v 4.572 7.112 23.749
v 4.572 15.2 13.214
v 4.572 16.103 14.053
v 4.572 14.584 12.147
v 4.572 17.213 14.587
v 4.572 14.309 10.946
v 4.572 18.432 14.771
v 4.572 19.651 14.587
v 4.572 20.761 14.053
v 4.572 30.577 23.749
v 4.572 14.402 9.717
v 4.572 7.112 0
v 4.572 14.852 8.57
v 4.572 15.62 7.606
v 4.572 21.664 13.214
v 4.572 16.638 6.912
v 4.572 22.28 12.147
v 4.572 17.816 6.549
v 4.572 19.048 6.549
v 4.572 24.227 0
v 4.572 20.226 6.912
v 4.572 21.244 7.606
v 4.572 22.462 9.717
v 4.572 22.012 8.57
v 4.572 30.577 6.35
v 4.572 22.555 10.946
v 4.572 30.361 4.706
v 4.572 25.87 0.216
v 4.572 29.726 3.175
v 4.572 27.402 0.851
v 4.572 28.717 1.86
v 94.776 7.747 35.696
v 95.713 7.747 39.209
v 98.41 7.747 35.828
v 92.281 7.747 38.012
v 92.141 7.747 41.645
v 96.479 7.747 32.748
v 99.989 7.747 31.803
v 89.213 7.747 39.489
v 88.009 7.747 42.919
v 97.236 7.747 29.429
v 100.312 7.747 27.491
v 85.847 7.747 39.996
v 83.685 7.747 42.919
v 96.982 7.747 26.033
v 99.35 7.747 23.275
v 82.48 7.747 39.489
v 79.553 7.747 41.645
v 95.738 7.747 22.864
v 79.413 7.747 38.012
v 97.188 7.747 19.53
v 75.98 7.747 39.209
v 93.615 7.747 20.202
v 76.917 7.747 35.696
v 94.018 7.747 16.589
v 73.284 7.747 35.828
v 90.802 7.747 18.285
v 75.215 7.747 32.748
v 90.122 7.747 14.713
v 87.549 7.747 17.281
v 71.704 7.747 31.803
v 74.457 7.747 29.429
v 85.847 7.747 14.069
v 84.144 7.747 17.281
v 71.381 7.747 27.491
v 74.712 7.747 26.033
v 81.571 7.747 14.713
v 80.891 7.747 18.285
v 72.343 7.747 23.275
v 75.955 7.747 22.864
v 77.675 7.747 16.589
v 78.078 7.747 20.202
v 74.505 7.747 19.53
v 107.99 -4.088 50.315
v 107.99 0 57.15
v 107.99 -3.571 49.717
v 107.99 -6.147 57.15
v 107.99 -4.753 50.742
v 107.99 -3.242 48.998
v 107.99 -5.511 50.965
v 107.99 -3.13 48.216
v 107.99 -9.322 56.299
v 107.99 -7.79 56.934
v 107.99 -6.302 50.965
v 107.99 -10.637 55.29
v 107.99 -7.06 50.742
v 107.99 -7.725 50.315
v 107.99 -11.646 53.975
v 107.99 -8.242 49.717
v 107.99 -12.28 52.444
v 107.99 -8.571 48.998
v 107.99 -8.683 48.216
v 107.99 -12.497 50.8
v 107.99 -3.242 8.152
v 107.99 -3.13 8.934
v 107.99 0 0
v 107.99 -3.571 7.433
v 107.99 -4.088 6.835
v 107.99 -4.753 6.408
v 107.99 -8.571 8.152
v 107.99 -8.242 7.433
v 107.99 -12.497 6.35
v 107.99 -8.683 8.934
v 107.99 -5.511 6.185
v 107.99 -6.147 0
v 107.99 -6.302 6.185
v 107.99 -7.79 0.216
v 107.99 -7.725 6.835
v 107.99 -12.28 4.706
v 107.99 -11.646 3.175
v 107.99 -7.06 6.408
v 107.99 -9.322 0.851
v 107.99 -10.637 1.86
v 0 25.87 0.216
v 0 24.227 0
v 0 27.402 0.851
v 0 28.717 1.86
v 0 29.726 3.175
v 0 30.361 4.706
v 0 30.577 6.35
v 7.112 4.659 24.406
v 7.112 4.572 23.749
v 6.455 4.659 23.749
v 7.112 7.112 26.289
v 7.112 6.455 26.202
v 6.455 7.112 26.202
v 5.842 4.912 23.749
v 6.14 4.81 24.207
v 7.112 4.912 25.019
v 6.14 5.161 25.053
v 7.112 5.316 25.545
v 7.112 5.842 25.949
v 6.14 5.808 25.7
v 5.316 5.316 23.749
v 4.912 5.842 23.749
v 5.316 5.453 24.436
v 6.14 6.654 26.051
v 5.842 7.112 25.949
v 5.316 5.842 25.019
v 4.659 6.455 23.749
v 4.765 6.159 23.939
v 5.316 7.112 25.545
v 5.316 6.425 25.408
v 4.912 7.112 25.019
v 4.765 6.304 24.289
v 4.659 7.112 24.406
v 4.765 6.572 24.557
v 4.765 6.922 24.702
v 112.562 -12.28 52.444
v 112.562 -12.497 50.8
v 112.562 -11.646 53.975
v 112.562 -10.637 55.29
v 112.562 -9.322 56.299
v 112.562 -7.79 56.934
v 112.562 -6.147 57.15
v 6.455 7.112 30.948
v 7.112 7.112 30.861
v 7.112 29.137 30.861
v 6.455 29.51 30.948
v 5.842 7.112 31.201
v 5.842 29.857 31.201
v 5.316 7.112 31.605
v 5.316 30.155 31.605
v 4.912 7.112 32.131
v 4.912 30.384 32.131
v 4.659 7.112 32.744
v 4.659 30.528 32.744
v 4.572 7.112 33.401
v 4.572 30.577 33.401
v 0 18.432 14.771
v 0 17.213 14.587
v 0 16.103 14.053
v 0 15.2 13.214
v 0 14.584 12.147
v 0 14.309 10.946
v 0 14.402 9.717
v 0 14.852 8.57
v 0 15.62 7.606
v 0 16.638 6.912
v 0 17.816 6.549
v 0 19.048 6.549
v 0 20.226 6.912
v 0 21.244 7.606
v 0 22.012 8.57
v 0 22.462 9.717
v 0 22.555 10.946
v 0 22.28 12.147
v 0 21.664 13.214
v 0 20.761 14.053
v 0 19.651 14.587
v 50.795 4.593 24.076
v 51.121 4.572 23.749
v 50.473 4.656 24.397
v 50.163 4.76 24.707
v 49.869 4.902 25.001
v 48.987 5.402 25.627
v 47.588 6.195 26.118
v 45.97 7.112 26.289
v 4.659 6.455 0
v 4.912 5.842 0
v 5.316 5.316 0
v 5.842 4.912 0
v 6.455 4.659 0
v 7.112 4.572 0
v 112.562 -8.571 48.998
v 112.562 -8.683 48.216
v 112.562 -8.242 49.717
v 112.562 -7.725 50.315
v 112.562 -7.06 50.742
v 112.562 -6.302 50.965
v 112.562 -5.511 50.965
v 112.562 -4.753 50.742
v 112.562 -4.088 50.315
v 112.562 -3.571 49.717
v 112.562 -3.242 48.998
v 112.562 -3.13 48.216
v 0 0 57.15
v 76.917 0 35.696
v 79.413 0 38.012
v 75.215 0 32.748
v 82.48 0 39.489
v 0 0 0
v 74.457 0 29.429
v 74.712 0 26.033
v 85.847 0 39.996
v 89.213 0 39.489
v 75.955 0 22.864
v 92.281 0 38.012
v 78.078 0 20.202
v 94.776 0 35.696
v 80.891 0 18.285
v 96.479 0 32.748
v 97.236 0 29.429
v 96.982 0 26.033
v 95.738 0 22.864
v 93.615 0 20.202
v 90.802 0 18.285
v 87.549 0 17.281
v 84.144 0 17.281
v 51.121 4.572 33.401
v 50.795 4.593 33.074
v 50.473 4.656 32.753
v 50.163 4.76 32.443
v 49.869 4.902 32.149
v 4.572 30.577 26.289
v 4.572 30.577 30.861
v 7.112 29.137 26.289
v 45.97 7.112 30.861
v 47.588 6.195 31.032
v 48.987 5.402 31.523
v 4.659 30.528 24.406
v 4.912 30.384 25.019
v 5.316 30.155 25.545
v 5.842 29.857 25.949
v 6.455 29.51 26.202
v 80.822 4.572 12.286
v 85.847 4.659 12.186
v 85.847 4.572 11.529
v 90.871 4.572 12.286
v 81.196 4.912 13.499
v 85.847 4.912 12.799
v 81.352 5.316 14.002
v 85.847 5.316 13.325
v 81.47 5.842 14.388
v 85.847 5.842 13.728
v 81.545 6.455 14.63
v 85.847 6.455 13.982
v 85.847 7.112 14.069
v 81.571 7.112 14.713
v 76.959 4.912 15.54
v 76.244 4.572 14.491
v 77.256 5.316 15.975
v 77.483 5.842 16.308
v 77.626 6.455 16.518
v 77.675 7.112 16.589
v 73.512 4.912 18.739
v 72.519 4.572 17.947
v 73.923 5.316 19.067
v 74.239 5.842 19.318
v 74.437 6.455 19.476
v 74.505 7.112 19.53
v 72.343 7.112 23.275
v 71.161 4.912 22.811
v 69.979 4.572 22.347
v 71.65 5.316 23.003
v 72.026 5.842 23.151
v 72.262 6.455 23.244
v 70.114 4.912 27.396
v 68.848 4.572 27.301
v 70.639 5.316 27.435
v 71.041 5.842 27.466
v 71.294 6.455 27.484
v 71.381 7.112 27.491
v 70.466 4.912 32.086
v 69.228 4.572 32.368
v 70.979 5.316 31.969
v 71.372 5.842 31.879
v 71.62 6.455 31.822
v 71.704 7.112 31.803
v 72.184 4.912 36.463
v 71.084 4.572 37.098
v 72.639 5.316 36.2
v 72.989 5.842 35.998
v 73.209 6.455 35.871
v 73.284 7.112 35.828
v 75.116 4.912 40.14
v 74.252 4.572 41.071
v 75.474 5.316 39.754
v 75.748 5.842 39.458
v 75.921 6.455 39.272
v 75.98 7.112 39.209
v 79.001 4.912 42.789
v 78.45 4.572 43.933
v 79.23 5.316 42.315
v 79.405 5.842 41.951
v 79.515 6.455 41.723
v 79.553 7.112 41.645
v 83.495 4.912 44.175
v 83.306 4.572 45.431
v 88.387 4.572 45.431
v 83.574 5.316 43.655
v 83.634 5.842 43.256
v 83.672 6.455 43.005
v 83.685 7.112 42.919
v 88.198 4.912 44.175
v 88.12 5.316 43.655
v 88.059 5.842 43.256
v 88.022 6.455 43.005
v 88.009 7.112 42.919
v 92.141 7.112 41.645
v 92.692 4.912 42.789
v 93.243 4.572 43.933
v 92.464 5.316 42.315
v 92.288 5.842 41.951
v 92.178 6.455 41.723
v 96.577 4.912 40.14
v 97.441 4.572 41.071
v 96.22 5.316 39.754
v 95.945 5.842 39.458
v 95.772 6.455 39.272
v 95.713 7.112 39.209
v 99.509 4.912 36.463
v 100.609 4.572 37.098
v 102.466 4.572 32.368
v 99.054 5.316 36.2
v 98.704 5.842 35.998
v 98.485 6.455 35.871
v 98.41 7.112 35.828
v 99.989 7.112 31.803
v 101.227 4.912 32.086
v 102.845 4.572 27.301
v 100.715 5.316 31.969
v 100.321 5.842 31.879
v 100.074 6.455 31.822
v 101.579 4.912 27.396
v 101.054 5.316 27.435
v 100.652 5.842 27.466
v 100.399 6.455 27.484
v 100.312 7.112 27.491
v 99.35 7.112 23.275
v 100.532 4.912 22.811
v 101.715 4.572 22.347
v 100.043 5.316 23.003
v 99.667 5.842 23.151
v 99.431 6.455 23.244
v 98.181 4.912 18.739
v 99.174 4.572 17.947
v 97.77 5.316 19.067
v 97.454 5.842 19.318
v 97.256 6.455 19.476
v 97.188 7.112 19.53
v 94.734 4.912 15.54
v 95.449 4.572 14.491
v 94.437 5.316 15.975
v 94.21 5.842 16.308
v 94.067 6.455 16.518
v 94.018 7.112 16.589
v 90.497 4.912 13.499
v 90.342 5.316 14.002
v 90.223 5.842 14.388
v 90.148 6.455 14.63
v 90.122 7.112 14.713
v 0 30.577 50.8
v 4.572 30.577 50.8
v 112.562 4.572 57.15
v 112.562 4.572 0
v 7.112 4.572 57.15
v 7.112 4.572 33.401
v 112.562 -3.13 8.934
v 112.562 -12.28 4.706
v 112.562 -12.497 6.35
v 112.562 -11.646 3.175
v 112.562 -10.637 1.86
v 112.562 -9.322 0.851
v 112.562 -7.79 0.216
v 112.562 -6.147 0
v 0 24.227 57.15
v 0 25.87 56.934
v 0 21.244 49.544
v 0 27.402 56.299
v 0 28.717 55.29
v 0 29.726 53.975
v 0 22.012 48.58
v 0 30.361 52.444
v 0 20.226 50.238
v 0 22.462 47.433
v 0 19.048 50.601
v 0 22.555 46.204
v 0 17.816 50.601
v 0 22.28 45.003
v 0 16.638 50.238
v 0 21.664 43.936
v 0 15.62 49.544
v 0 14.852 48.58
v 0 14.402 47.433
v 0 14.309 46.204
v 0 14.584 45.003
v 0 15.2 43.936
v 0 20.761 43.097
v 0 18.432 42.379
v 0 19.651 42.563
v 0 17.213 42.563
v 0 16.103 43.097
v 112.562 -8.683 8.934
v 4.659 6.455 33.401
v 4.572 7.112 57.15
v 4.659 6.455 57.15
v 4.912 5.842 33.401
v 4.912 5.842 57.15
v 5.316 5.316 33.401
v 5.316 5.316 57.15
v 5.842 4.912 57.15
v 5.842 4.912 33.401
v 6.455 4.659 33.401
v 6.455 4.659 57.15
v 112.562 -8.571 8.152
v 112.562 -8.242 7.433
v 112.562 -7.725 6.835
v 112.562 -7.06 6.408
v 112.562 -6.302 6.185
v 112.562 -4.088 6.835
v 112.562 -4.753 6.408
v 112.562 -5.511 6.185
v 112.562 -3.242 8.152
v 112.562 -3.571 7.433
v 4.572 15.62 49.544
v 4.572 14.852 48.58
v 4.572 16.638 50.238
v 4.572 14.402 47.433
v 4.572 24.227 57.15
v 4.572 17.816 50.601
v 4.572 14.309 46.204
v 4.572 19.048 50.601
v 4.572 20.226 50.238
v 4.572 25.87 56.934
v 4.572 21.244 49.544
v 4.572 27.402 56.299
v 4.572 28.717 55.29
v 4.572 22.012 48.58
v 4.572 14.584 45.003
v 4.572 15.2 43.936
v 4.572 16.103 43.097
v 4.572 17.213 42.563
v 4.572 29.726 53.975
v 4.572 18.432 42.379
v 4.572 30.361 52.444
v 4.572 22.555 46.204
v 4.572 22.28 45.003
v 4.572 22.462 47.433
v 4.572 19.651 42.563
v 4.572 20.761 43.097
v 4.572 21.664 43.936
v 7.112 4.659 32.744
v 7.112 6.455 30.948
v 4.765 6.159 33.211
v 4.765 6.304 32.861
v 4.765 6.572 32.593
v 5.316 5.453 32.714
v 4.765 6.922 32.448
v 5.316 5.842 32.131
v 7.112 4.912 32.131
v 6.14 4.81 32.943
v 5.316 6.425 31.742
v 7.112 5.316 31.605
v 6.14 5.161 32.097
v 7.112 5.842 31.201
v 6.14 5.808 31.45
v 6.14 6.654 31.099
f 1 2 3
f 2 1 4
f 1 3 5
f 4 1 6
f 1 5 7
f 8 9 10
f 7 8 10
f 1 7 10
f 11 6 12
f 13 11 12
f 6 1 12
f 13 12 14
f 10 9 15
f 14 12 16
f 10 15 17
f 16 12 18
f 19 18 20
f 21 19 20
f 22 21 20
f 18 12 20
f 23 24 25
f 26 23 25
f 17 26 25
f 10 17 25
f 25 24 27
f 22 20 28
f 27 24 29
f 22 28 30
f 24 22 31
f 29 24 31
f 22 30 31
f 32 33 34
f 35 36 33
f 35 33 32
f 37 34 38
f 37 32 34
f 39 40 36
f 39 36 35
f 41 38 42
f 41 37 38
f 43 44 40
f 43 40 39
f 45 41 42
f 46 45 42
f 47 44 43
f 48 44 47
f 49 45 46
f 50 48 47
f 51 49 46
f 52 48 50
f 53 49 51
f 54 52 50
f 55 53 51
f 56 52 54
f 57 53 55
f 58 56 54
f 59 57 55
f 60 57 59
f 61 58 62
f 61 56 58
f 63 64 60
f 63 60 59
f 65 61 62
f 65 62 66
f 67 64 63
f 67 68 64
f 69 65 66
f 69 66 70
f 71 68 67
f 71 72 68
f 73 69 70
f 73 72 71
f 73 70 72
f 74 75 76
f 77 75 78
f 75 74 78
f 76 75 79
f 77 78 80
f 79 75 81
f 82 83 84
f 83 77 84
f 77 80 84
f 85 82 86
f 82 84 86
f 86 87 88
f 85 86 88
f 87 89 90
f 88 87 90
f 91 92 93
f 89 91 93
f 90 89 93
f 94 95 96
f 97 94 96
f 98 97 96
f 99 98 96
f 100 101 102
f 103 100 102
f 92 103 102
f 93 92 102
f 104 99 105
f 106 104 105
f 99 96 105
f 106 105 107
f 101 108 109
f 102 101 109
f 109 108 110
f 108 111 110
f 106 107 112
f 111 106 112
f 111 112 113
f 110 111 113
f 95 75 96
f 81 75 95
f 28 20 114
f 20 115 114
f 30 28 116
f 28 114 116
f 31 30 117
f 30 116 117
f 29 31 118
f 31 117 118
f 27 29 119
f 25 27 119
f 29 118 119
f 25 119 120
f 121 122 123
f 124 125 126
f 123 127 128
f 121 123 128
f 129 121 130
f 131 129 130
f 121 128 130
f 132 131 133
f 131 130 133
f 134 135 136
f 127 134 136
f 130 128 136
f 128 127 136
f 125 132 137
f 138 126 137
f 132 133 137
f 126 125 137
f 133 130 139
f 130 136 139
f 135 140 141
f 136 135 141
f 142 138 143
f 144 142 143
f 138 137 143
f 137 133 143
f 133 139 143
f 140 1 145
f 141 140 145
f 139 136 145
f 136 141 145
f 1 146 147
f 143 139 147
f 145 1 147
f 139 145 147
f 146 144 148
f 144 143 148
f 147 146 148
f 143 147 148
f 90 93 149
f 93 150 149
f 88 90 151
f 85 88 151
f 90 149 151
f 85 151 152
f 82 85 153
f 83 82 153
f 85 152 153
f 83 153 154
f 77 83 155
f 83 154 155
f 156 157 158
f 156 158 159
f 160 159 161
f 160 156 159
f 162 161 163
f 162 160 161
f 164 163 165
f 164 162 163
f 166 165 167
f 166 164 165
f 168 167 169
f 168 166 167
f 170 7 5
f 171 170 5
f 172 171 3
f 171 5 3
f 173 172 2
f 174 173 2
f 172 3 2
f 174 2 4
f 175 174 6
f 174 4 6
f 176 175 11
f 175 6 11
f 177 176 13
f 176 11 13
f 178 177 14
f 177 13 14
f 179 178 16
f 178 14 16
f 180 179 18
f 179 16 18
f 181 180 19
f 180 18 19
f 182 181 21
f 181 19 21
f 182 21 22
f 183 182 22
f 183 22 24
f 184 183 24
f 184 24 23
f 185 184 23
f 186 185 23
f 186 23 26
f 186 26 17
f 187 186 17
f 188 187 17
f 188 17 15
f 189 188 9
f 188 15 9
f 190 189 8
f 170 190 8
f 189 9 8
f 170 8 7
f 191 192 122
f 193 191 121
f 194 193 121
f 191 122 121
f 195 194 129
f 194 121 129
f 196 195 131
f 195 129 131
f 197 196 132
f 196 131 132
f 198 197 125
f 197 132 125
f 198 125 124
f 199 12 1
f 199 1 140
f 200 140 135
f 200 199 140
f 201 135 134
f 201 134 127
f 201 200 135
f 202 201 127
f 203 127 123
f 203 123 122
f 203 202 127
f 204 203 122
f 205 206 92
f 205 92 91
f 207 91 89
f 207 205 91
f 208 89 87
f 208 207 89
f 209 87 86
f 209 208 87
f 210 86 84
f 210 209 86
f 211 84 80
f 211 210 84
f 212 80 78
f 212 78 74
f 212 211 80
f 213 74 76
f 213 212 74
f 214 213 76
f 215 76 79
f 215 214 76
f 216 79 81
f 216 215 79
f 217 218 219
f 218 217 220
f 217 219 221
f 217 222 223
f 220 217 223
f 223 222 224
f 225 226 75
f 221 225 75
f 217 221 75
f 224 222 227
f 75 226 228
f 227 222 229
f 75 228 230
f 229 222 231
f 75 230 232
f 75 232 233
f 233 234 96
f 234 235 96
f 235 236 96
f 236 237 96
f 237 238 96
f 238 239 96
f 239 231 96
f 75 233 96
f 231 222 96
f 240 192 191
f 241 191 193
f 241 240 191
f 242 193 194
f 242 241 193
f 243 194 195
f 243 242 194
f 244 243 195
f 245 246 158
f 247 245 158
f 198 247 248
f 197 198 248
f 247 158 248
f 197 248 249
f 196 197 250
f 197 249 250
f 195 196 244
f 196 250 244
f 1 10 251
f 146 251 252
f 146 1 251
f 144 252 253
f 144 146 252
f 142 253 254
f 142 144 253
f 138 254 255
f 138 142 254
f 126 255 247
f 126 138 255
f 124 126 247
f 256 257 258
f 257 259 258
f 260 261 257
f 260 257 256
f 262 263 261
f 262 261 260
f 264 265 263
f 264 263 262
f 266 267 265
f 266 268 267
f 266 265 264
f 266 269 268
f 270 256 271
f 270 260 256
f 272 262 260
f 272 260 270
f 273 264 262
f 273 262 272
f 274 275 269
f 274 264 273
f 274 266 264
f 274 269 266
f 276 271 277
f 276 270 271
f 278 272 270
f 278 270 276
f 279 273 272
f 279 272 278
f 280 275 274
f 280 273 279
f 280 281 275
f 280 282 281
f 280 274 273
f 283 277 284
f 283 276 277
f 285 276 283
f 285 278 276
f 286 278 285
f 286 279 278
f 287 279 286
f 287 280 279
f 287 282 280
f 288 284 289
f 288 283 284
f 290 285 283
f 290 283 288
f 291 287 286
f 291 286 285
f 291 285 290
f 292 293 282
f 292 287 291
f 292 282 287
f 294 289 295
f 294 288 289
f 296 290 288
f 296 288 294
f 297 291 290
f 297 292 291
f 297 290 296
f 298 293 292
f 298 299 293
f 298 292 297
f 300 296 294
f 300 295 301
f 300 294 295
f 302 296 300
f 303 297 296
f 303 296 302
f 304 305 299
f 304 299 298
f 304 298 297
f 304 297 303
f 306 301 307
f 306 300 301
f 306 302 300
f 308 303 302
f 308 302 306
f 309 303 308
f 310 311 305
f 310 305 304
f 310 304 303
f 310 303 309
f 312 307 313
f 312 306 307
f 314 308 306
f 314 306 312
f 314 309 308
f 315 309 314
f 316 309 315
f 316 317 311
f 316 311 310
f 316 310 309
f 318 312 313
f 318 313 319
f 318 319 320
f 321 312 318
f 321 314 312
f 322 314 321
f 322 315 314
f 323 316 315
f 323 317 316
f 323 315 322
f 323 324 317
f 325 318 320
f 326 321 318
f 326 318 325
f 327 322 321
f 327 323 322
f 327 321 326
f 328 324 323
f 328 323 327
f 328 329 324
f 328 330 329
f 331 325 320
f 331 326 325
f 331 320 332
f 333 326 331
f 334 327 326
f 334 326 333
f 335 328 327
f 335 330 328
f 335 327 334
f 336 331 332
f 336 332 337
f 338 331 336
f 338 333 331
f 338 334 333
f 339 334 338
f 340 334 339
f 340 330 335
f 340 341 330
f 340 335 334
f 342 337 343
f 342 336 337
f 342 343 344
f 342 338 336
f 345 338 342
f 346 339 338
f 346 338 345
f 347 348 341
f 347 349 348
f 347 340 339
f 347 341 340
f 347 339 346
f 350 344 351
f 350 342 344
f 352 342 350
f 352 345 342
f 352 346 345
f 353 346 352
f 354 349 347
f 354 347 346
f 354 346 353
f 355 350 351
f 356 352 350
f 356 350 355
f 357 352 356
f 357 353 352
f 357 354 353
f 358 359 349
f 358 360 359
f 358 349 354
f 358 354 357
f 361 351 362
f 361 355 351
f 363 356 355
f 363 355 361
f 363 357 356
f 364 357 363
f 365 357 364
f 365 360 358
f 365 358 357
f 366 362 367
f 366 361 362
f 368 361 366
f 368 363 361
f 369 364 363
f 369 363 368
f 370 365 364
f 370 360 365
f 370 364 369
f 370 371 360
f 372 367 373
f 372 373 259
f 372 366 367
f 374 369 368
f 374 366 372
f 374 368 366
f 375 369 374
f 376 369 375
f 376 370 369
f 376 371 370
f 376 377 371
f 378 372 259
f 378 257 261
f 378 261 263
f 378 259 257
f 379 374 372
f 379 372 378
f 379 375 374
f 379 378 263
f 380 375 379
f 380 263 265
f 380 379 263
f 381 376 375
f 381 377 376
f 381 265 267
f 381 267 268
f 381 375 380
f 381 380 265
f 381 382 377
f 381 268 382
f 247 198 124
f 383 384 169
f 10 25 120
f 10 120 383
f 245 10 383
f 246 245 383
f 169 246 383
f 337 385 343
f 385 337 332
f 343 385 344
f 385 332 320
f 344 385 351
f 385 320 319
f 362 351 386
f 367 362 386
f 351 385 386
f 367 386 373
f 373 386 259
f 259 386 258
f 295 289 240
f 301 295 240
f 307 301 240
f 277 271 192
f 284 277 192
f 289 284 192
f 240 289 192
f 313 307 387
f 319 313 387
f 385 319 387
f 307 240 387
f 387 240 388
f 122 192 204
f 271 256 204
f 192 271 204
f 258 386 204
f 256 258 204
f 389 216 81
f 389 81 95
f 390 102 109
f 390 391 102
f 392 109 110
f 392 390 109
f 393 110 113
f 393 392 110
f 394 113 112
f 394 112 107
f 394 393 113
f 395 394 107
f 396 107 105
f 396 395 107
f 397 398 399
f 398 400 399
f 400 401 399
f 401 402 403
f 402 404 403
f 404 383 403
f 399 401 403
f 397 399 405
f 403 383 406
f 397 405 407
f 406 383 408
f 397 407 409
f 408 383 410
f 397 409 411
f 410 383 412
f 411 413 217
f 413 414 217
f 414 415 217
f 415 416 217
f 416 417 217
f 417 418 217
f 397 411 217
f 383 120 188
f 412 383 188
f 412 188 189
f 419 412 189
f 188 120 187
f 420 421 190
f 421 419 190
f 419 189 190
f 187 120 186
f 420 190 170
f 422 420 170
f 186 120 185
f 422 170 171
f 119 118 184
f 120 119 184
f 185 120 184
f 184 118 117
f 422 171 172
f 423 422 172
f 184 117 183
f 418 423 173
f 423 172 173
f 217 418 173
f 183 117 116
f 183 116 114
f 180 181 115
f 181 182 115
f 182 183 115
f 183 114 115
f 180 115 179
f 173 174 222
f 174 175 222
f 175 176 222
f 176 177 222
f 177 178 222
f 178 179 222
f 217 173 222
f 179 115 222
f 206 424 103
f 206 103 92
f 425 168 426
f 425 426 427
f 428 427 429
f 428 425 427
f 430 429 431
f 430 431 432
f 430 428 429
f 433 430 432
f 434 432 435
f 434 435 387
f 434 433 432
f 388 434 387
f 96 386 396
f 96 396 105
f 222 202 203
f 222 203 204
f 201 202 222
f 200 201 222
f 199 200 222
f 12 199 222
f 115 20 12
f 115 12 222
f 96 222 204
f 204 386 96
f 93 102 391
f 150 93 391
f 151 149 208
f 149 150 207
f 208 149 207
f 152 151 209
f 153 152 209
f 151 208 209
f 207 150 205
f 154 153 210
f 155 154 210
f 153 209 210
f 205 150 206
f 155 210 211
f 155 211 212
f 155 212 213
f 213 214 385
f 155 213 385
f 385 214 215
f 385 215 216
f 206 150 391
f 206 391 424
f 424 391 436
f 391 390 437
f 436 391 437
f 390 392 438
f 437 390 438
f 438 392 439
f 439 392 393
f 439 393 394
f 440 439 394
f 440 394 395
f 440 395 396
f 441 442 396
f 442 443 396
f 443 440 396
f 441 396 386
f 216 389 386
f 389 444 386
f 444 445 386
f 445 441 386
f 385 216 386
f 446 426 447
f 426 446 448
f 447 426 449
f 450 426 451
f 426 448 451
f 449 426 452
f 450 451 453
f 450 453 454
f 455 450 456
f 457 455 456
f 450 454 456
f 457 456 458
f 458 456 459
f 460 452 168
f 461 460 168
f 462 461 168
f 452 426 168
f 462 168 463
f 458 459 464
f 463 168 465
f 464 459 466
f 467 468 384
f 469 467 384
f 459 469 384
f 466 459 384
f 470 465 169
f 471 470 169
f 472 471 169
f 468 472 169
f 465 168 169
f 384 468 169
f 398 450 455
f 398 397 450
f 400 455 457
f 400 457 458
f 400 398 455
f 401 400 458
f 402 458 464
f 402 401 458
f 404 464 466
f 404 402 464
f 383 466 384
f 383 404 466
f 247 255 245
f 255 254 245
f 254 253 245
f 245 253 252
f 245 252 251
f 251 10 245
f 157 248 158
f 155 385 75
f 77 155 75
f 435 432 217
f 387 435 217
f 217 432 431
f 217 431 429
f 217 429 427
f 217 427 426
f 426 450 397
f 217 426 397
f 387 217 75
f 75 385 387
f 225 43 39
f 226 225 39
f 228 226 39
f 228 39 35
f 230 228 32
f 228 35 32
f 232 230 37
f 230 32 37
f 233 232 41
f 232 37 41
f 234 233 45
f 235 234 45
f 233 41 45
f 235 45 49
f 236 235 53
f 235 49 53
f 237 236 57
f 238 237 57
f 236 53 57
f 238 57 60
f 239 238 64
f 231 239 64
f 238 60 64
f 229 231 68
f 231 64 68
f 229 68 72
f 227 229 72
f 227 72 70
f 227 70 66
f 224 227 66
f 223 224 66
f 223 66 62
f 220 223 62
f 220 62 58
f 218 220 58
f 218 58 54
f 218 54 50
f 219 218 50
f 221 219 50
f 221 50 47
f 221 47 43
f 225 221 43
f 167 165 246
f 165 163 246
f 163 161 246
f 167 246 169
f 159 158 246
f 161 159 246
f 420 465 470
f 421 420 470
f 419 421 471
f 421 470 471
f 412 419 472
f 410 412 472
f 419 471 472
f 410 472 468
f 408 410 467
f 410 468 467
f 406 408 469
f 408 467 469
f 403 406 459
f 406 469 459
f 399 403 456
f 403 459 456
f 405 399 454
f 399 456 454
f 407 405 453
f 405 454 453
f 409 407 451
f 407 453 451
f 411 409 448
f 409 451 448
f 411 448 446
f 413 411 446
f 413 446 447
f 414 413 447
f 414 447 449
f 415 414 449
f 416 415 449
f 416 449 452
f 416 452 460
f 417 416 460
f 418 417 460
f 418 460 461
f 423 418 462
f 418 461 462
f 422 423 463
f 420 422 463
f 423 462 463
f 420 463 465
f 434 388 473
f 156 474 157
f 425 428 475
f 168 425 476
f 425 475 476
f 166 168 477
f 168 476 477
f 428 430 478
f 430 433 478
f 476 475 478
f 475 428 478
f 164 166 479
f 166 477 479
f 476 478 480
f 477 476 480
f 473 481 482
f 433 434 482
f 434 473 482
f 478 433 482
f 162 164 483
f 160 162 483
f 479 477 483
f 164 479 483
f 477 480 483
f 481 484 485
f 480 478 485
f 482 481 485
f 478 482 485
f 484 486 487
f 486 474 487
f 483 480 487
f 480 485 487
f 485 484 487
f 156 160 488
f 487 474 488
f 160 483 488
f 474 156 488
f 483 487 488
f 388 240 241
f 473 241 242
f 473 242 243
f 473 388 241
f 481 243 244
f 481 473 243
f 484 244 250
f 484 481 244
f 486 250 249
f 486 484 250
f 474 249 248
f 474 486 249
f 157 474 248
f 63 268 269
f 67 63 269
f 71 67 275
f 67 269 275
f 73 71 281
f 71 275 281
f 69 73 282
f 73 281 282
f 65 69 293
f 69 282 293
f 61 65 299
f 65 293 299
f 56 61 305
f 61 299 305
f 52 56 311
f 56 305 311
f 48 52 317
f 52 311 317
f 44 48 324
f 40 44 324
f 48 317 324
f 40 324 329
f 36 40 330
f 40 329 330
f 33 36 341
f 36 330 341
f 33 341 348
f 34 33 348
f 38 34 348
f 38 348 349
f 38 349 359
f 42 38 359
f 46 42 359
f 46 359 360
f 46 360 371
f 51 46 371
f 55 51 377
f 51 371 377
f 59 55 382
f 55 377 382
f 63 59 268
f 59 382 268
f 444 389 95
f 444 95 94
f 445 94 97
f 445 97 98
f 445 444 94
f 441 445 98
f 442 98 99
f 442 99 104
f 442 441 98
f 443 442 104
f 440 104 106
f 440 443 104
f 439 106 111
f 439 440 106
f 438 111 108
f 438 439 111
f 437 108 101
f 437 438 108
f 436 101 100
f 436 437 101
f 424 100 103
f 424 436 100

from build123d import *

# Parameters (mm, degrees)
EXTRUDE1_DEPTH = 57.15
SKETCH2_R      = 14.506414019
EXTRUDE2_DEPTH = 3.175
FILLET1_R      = 2.54
SKETCH3_R      = 11.421445599
EXTRUDE3_DEPTH = 15.875
EXTRUDE4_DEPTH = 2.286
FILLET4_R      = 2.54
FILLET5_R      = 6.35
EXTRUDE5_DEPTH = 4.572
SKETCH6_R      = 4.134080516
EXTRUDE6_DEPTH = 4.572


with BuildPart() as part:
    # Sketch1 → Extrude1 (new body)
    with BuildSketch(Plane.XY):
        Polygon((0, 30.576970443), (0, 0), (107.990032379, 0), (107.990032379, -12.496674877), (112.562032379, -12.496674877), (112.562032379, 4.572), (4.572, 4.572), (4.572, 30.576970443), align=None)
    extrude(amount=EXTRUDE1_DEPTH)

    # Sketch2 → Extrude2 (add)
    with BuildSketch(Plane(origin=(0, 4.572, 0), x_dir=(-1, 0, 0), z_dir=(0, 1, 0))):
        with Locations(Location((-85.846627335, 28.575, 0), (0, 0, 270))):
            Circle(SKETCH2_R)
    extrude(amount=EXTRUDE2_DEPTH)

    # Fillet1
    fillet1_edges = [part.edges().sort_by_distance(p)[0] for p in [
        (85.846627335, 4.572, 43.081414019),
    ]]
    fillet(fillet1_edges, radius=FILLET1_R)

    # Sketch3 → Extrude3 (cut)
    with BuildSketch(Plane(origin=(0, 7.747, 0), x_dir=(-1, 0, 0), z_dir=(0, 1, 0))):
        with Locations(Location((-85.846627335, 28.575, 0), (0, 0, 90))):
            Circle(SKETCH3_R)
    extrude(amount=-EXTRUDE3_DEPTH, mode=Mode.SUBTRACT)

    # Sketch4 → Extrude4 (add, symmetric)
    with BuildSketch(Plane.XY.offset(28.575)):
        Polygon((4.572, 30.576970443), (50.451305306, 4.572), (4.572, 4.572), align=None)
    extrude(amount=EXTRUDE4_DEPTH, both=True)

    # Fillet4
    fillet4_edges = [part.edges().sort_by_distance(p)[0] for p in [
        (27.511652653, 4.572, 26.289),
    ]]
    fillet(fillet4_edges, radius=FILLET4_R)
    fillet4_2_edges = [part.edges().sort_by_distance(p)[0] for p in [
        (27.511652653, 4.572, 30.861),
    ]]
    fillet(fillet4_2_edges, radius=FILLET4_R)
    fillet4_3_edges = [part.edges().sort_by_distance(p)[0] for p in [
        (50.451305306, 4.572, 28.575),
    ]]
    fillet(fillet4_3_edges, radius=FILLET4_R)
    # the kernel refuses this fillet: 2.54 mm, written as the material it adds along each edge
    with BuildSketch(Plane(origin=(4.572, 4.572, 0), x_dir=(1, 0, 0), z_dir=(0, 0, 1))) as fillet4_4_piece_1:
        with BuildLine():
            CenterArc((FILLET4_R, FILLET4_R), FILLET4_R, 180, 90)
            Line((0, FILLET4_R), (-FILLET4_R * 0.02, FILLET4_R))
            Line((-FILLET4_R * 0.02, FILLET4_R), (-FILLET4_R * 0.02, -FILLET4_R * 0.02))
            Line((-FILLET4_R * 0.02, -FILLET4_R * 0.02), (FILLET4_R, -FILLET4_R * 0.02))
            Line((FILLET4_R, -FILLET4_R * 0.02), (FILLET4_R, 0))
        make_face()
    extrude(amount=23.749)
    with BuildSketch(Plane(origin=(4.572, 7.112, 23.749), x_dir=(0, -1, 0), z_dir=(0, 0, -1))) as fillet4_4_piece_2:
        with BuildLine():
            CenterArc((2.54 - FILLET4_R, -FILLET4_R), FILLET4_R, 0, 90)
            Line((2.54 - FILLET4_R, 0), (2.54 - FILLET4_R, FILLET4_R * 0.02))
            Line((2.54 - FILLET4_R, FILLET4_R * 0.02), (2.54, FILLET4_R * 0.02))
            Line((2.54, FILLET4_R * 0.02), (2.54 + FILLET4_R * 0.02, 0))
            Line((2.54 + FILLET4_R * 0.02, 0), (2.54 + FILLET4_R * 0.02, -FILLET4_R))
            Line((2.54 + FILLET4_R * 0.02, -FILLET4_R), (2.54, -FILLET4_R))
        make_face()
    revolve(axis=Axis((4.572, 7.112, 23.749), (-1, 0, 0)), revolution_arc=90)
    with BuildSketch(Plane(origin=(4.572, 7.112, 26.289), x_dir=(0, 0, -1), z_dir=(0, 1, 0))) as fillet4_4_piece_3_section:
        with BuildLine():
            CenterArc((FILLET4_R, -FILLET4_R), FILLET4_R, 90, 90)
            Line((0, -FILLET4_R), (-FILLET4_R * 0.02, -FILLET4_R))
            Line((-FILLET4_R * 0.02, -FILLET4_R), (-FILLET4_R * 0.02, FILLET4_R * 0.02))
            Line((-FILLET4_R * 0.02, FILLET4_R * 0.02), (FILLET4_R, FILLET4_R * 0.02))
            Line((FILLET4_R, FILLET4_R * 0.02), (FILLET4_R, 0))
        make_face()
    fillet4_4_piece_3 = extrude(amount=23.464970443, mode=Mode.PRIVATE)
    fillet4_4_piece_3 = split(fillet4_4_piece_3, bisect_by=Plane(origin=(10.10405857, 27.441329687, 25.709650316), z_dir=(-0.49310869822243814, -0.8699677072957206, 0)), keep=Keep.TOP, mode=Mode.PRIVATE)
    add(fillet4_4_piece_3)
    # the kernel refuses this fillet: 2.54 mm, written as the material it adds along each edge
    with BuildSketch(Plane(origin=(4.572, 4.572, 33.401), x_dir=(1, 0, 0), z_dir=(0, 0, 1))) as fillet4_5_piece_1:
        with BuildLine():
            CenterArc((FILLET4_R, FILLET4_R), FILLET4_R, 180, 90)
            Line((0, FILLET4_R), (-FILLET4_R * 0.02, FILLET4_R))
            Line((-FILLET4_R * 0.02, FILLET4_R), (-FILLET4_R * 0.02, -FILLET4_R * 0.02))
            Line((-FILLET4_R * 0.02, -FILLET4_R * 0.02), (FILLET4_R, -FILLET4_R * 0.02))
            Line((FILLET4_R, -FILLET4_R * 0.02), (FILLET4_R, 0))
        make_face()
    extrude(amount=23.749)
    with BuildSketch(Plane(origin=(4.572, 7.112, 33.401), x_dir=(0, -1, 0), z_dir=(0, 0, 1))) as fillet4_5_piece_2:
        with BuildLine():
            CenterArc((2.54 - FILLET4_R, FILLET4_R), FILLET4_R, 270, 90)
            Line((2.54 - FILLET4_R, 0), (2.54 - FILLET4_R, -FILLET4_R * 0.02))
            Line((2.54 - FILLET4_R, -FILLET4_R * 0.02), (2.54, -FILLET4_R * 0.02))
            Line((2.54, -FILLET4_R * 0.02), (2.54 + FILLET4_R * 0.02, 0))
            Line((2.54 + FILLET4_R * 0.02, 0), (2.54 + FILLET4_R * 0.02, FILLET4_R))
            Line((2.54 + FILLET4_R * 0.02, FILLET4_R), (2.54, FILLET4_R))
        make_face()
    revolve(axis=Axis((4.572, 7.112, 33.401), (1, 0, 0)), revolution_arc=90)
    with BuildSketch(Plane(origin=(4.572, 7.112, 30.861), x_dir=(1, 0, 0), z_dir=(0, 1, 0))) as fillet4_5_piece_3_section:
        with BuildLine():
            CenterArc((FILLET4_R, -FILLET4_R), FILLET4_R, 90, 90)
            Line((0, -FILLET4_R), (-FILLET4_R * 0.02, -FILLET4_R))
            Line((-FILLET4_R * 0.02, -FILLET4_R), (-FILLET4_R * 0.02, FILLET4_R * 0.02))
            Line((-FILLET4_R * 0.02, FILLET4_R * 0.02), (FILLET4_R, FILLET4_R * 0.02))
            Line((FILLET4_R, FILLET4_R * 0.02), (FILLET4_R, 0))
        make_face()
    fillet4_5_piece_3 = extrude(amount=23.464970443, mode=Mode.PRIVATE)
    fillet4_5_piece_3 = split(fillet4_5_piece_3, bisect_by=Plane(origin=(10.10405857, 27.441329687, 31.440349684), z_dir=(-0.49310869822243814, -0.8699677072957206, 0)), keep=Keep.TOP, mode=Mode.PRIVATE)
    add(fillet4_5_piece_3)

    # Fillet5
    fillet5_edges = [part.edges().sort_by_distance(p)[0] for p in [
        (2.286, 30.576970443, 0),
        (110.276032379, -12.496674877, 57.15),
        (2.286, 30.576970443, 57.15),
        (110.276032379, -12.496674877, 0),
    ]]
    fillet(fillet5_edges, radius=FILLET5_R)

    # Sketch5 → Extrude5 (cut)
    with BuildSketch(Plane(origin=(112.562032379, 0, 0), x_dir=(0, 0, -1), z_dir=(1, 0, 0))):
        with BuildLine():
            Line((-48.21617711, -3.129971145), (-8.93382289, -3.129971145))
            ThreePointArc((-8.93382289, -3.129971145), (-6.157220398, -5.906573636), (-8.93382289, -8.683176127))
            Line((-8.93382289, -8.683176127), (-48.21617711, -8.683176127))
            ThreePointArc((-48.21617711, -8.683176127), (-50.992779602, -5.906573636), (-48.21617711, -3.129971145))
        make_face()
    extrude(amount=-EXTRUDE5_DEPTH, mode=Mode.SUBTRACT)

    # Sketch6 → Extrude6 (cut)
    with BuildSketch(Plane(origin=(4.572, 0, 0), x_dir=(0, 0, -1), z_dir=(1, 0, 0))):
        with Locations((-46.51308259, 18.4320182)):
            Circle(SKETCH6_R)
        with Locations(Location((-10.63691741, 18.4320182, 0), (0, 0, 180))):
            Circle(SKETCH6_R)
    extrude(amount=-EXTRUDE6_DEPTH, mode=Mode.SUBTRACT)


solid = part.part
